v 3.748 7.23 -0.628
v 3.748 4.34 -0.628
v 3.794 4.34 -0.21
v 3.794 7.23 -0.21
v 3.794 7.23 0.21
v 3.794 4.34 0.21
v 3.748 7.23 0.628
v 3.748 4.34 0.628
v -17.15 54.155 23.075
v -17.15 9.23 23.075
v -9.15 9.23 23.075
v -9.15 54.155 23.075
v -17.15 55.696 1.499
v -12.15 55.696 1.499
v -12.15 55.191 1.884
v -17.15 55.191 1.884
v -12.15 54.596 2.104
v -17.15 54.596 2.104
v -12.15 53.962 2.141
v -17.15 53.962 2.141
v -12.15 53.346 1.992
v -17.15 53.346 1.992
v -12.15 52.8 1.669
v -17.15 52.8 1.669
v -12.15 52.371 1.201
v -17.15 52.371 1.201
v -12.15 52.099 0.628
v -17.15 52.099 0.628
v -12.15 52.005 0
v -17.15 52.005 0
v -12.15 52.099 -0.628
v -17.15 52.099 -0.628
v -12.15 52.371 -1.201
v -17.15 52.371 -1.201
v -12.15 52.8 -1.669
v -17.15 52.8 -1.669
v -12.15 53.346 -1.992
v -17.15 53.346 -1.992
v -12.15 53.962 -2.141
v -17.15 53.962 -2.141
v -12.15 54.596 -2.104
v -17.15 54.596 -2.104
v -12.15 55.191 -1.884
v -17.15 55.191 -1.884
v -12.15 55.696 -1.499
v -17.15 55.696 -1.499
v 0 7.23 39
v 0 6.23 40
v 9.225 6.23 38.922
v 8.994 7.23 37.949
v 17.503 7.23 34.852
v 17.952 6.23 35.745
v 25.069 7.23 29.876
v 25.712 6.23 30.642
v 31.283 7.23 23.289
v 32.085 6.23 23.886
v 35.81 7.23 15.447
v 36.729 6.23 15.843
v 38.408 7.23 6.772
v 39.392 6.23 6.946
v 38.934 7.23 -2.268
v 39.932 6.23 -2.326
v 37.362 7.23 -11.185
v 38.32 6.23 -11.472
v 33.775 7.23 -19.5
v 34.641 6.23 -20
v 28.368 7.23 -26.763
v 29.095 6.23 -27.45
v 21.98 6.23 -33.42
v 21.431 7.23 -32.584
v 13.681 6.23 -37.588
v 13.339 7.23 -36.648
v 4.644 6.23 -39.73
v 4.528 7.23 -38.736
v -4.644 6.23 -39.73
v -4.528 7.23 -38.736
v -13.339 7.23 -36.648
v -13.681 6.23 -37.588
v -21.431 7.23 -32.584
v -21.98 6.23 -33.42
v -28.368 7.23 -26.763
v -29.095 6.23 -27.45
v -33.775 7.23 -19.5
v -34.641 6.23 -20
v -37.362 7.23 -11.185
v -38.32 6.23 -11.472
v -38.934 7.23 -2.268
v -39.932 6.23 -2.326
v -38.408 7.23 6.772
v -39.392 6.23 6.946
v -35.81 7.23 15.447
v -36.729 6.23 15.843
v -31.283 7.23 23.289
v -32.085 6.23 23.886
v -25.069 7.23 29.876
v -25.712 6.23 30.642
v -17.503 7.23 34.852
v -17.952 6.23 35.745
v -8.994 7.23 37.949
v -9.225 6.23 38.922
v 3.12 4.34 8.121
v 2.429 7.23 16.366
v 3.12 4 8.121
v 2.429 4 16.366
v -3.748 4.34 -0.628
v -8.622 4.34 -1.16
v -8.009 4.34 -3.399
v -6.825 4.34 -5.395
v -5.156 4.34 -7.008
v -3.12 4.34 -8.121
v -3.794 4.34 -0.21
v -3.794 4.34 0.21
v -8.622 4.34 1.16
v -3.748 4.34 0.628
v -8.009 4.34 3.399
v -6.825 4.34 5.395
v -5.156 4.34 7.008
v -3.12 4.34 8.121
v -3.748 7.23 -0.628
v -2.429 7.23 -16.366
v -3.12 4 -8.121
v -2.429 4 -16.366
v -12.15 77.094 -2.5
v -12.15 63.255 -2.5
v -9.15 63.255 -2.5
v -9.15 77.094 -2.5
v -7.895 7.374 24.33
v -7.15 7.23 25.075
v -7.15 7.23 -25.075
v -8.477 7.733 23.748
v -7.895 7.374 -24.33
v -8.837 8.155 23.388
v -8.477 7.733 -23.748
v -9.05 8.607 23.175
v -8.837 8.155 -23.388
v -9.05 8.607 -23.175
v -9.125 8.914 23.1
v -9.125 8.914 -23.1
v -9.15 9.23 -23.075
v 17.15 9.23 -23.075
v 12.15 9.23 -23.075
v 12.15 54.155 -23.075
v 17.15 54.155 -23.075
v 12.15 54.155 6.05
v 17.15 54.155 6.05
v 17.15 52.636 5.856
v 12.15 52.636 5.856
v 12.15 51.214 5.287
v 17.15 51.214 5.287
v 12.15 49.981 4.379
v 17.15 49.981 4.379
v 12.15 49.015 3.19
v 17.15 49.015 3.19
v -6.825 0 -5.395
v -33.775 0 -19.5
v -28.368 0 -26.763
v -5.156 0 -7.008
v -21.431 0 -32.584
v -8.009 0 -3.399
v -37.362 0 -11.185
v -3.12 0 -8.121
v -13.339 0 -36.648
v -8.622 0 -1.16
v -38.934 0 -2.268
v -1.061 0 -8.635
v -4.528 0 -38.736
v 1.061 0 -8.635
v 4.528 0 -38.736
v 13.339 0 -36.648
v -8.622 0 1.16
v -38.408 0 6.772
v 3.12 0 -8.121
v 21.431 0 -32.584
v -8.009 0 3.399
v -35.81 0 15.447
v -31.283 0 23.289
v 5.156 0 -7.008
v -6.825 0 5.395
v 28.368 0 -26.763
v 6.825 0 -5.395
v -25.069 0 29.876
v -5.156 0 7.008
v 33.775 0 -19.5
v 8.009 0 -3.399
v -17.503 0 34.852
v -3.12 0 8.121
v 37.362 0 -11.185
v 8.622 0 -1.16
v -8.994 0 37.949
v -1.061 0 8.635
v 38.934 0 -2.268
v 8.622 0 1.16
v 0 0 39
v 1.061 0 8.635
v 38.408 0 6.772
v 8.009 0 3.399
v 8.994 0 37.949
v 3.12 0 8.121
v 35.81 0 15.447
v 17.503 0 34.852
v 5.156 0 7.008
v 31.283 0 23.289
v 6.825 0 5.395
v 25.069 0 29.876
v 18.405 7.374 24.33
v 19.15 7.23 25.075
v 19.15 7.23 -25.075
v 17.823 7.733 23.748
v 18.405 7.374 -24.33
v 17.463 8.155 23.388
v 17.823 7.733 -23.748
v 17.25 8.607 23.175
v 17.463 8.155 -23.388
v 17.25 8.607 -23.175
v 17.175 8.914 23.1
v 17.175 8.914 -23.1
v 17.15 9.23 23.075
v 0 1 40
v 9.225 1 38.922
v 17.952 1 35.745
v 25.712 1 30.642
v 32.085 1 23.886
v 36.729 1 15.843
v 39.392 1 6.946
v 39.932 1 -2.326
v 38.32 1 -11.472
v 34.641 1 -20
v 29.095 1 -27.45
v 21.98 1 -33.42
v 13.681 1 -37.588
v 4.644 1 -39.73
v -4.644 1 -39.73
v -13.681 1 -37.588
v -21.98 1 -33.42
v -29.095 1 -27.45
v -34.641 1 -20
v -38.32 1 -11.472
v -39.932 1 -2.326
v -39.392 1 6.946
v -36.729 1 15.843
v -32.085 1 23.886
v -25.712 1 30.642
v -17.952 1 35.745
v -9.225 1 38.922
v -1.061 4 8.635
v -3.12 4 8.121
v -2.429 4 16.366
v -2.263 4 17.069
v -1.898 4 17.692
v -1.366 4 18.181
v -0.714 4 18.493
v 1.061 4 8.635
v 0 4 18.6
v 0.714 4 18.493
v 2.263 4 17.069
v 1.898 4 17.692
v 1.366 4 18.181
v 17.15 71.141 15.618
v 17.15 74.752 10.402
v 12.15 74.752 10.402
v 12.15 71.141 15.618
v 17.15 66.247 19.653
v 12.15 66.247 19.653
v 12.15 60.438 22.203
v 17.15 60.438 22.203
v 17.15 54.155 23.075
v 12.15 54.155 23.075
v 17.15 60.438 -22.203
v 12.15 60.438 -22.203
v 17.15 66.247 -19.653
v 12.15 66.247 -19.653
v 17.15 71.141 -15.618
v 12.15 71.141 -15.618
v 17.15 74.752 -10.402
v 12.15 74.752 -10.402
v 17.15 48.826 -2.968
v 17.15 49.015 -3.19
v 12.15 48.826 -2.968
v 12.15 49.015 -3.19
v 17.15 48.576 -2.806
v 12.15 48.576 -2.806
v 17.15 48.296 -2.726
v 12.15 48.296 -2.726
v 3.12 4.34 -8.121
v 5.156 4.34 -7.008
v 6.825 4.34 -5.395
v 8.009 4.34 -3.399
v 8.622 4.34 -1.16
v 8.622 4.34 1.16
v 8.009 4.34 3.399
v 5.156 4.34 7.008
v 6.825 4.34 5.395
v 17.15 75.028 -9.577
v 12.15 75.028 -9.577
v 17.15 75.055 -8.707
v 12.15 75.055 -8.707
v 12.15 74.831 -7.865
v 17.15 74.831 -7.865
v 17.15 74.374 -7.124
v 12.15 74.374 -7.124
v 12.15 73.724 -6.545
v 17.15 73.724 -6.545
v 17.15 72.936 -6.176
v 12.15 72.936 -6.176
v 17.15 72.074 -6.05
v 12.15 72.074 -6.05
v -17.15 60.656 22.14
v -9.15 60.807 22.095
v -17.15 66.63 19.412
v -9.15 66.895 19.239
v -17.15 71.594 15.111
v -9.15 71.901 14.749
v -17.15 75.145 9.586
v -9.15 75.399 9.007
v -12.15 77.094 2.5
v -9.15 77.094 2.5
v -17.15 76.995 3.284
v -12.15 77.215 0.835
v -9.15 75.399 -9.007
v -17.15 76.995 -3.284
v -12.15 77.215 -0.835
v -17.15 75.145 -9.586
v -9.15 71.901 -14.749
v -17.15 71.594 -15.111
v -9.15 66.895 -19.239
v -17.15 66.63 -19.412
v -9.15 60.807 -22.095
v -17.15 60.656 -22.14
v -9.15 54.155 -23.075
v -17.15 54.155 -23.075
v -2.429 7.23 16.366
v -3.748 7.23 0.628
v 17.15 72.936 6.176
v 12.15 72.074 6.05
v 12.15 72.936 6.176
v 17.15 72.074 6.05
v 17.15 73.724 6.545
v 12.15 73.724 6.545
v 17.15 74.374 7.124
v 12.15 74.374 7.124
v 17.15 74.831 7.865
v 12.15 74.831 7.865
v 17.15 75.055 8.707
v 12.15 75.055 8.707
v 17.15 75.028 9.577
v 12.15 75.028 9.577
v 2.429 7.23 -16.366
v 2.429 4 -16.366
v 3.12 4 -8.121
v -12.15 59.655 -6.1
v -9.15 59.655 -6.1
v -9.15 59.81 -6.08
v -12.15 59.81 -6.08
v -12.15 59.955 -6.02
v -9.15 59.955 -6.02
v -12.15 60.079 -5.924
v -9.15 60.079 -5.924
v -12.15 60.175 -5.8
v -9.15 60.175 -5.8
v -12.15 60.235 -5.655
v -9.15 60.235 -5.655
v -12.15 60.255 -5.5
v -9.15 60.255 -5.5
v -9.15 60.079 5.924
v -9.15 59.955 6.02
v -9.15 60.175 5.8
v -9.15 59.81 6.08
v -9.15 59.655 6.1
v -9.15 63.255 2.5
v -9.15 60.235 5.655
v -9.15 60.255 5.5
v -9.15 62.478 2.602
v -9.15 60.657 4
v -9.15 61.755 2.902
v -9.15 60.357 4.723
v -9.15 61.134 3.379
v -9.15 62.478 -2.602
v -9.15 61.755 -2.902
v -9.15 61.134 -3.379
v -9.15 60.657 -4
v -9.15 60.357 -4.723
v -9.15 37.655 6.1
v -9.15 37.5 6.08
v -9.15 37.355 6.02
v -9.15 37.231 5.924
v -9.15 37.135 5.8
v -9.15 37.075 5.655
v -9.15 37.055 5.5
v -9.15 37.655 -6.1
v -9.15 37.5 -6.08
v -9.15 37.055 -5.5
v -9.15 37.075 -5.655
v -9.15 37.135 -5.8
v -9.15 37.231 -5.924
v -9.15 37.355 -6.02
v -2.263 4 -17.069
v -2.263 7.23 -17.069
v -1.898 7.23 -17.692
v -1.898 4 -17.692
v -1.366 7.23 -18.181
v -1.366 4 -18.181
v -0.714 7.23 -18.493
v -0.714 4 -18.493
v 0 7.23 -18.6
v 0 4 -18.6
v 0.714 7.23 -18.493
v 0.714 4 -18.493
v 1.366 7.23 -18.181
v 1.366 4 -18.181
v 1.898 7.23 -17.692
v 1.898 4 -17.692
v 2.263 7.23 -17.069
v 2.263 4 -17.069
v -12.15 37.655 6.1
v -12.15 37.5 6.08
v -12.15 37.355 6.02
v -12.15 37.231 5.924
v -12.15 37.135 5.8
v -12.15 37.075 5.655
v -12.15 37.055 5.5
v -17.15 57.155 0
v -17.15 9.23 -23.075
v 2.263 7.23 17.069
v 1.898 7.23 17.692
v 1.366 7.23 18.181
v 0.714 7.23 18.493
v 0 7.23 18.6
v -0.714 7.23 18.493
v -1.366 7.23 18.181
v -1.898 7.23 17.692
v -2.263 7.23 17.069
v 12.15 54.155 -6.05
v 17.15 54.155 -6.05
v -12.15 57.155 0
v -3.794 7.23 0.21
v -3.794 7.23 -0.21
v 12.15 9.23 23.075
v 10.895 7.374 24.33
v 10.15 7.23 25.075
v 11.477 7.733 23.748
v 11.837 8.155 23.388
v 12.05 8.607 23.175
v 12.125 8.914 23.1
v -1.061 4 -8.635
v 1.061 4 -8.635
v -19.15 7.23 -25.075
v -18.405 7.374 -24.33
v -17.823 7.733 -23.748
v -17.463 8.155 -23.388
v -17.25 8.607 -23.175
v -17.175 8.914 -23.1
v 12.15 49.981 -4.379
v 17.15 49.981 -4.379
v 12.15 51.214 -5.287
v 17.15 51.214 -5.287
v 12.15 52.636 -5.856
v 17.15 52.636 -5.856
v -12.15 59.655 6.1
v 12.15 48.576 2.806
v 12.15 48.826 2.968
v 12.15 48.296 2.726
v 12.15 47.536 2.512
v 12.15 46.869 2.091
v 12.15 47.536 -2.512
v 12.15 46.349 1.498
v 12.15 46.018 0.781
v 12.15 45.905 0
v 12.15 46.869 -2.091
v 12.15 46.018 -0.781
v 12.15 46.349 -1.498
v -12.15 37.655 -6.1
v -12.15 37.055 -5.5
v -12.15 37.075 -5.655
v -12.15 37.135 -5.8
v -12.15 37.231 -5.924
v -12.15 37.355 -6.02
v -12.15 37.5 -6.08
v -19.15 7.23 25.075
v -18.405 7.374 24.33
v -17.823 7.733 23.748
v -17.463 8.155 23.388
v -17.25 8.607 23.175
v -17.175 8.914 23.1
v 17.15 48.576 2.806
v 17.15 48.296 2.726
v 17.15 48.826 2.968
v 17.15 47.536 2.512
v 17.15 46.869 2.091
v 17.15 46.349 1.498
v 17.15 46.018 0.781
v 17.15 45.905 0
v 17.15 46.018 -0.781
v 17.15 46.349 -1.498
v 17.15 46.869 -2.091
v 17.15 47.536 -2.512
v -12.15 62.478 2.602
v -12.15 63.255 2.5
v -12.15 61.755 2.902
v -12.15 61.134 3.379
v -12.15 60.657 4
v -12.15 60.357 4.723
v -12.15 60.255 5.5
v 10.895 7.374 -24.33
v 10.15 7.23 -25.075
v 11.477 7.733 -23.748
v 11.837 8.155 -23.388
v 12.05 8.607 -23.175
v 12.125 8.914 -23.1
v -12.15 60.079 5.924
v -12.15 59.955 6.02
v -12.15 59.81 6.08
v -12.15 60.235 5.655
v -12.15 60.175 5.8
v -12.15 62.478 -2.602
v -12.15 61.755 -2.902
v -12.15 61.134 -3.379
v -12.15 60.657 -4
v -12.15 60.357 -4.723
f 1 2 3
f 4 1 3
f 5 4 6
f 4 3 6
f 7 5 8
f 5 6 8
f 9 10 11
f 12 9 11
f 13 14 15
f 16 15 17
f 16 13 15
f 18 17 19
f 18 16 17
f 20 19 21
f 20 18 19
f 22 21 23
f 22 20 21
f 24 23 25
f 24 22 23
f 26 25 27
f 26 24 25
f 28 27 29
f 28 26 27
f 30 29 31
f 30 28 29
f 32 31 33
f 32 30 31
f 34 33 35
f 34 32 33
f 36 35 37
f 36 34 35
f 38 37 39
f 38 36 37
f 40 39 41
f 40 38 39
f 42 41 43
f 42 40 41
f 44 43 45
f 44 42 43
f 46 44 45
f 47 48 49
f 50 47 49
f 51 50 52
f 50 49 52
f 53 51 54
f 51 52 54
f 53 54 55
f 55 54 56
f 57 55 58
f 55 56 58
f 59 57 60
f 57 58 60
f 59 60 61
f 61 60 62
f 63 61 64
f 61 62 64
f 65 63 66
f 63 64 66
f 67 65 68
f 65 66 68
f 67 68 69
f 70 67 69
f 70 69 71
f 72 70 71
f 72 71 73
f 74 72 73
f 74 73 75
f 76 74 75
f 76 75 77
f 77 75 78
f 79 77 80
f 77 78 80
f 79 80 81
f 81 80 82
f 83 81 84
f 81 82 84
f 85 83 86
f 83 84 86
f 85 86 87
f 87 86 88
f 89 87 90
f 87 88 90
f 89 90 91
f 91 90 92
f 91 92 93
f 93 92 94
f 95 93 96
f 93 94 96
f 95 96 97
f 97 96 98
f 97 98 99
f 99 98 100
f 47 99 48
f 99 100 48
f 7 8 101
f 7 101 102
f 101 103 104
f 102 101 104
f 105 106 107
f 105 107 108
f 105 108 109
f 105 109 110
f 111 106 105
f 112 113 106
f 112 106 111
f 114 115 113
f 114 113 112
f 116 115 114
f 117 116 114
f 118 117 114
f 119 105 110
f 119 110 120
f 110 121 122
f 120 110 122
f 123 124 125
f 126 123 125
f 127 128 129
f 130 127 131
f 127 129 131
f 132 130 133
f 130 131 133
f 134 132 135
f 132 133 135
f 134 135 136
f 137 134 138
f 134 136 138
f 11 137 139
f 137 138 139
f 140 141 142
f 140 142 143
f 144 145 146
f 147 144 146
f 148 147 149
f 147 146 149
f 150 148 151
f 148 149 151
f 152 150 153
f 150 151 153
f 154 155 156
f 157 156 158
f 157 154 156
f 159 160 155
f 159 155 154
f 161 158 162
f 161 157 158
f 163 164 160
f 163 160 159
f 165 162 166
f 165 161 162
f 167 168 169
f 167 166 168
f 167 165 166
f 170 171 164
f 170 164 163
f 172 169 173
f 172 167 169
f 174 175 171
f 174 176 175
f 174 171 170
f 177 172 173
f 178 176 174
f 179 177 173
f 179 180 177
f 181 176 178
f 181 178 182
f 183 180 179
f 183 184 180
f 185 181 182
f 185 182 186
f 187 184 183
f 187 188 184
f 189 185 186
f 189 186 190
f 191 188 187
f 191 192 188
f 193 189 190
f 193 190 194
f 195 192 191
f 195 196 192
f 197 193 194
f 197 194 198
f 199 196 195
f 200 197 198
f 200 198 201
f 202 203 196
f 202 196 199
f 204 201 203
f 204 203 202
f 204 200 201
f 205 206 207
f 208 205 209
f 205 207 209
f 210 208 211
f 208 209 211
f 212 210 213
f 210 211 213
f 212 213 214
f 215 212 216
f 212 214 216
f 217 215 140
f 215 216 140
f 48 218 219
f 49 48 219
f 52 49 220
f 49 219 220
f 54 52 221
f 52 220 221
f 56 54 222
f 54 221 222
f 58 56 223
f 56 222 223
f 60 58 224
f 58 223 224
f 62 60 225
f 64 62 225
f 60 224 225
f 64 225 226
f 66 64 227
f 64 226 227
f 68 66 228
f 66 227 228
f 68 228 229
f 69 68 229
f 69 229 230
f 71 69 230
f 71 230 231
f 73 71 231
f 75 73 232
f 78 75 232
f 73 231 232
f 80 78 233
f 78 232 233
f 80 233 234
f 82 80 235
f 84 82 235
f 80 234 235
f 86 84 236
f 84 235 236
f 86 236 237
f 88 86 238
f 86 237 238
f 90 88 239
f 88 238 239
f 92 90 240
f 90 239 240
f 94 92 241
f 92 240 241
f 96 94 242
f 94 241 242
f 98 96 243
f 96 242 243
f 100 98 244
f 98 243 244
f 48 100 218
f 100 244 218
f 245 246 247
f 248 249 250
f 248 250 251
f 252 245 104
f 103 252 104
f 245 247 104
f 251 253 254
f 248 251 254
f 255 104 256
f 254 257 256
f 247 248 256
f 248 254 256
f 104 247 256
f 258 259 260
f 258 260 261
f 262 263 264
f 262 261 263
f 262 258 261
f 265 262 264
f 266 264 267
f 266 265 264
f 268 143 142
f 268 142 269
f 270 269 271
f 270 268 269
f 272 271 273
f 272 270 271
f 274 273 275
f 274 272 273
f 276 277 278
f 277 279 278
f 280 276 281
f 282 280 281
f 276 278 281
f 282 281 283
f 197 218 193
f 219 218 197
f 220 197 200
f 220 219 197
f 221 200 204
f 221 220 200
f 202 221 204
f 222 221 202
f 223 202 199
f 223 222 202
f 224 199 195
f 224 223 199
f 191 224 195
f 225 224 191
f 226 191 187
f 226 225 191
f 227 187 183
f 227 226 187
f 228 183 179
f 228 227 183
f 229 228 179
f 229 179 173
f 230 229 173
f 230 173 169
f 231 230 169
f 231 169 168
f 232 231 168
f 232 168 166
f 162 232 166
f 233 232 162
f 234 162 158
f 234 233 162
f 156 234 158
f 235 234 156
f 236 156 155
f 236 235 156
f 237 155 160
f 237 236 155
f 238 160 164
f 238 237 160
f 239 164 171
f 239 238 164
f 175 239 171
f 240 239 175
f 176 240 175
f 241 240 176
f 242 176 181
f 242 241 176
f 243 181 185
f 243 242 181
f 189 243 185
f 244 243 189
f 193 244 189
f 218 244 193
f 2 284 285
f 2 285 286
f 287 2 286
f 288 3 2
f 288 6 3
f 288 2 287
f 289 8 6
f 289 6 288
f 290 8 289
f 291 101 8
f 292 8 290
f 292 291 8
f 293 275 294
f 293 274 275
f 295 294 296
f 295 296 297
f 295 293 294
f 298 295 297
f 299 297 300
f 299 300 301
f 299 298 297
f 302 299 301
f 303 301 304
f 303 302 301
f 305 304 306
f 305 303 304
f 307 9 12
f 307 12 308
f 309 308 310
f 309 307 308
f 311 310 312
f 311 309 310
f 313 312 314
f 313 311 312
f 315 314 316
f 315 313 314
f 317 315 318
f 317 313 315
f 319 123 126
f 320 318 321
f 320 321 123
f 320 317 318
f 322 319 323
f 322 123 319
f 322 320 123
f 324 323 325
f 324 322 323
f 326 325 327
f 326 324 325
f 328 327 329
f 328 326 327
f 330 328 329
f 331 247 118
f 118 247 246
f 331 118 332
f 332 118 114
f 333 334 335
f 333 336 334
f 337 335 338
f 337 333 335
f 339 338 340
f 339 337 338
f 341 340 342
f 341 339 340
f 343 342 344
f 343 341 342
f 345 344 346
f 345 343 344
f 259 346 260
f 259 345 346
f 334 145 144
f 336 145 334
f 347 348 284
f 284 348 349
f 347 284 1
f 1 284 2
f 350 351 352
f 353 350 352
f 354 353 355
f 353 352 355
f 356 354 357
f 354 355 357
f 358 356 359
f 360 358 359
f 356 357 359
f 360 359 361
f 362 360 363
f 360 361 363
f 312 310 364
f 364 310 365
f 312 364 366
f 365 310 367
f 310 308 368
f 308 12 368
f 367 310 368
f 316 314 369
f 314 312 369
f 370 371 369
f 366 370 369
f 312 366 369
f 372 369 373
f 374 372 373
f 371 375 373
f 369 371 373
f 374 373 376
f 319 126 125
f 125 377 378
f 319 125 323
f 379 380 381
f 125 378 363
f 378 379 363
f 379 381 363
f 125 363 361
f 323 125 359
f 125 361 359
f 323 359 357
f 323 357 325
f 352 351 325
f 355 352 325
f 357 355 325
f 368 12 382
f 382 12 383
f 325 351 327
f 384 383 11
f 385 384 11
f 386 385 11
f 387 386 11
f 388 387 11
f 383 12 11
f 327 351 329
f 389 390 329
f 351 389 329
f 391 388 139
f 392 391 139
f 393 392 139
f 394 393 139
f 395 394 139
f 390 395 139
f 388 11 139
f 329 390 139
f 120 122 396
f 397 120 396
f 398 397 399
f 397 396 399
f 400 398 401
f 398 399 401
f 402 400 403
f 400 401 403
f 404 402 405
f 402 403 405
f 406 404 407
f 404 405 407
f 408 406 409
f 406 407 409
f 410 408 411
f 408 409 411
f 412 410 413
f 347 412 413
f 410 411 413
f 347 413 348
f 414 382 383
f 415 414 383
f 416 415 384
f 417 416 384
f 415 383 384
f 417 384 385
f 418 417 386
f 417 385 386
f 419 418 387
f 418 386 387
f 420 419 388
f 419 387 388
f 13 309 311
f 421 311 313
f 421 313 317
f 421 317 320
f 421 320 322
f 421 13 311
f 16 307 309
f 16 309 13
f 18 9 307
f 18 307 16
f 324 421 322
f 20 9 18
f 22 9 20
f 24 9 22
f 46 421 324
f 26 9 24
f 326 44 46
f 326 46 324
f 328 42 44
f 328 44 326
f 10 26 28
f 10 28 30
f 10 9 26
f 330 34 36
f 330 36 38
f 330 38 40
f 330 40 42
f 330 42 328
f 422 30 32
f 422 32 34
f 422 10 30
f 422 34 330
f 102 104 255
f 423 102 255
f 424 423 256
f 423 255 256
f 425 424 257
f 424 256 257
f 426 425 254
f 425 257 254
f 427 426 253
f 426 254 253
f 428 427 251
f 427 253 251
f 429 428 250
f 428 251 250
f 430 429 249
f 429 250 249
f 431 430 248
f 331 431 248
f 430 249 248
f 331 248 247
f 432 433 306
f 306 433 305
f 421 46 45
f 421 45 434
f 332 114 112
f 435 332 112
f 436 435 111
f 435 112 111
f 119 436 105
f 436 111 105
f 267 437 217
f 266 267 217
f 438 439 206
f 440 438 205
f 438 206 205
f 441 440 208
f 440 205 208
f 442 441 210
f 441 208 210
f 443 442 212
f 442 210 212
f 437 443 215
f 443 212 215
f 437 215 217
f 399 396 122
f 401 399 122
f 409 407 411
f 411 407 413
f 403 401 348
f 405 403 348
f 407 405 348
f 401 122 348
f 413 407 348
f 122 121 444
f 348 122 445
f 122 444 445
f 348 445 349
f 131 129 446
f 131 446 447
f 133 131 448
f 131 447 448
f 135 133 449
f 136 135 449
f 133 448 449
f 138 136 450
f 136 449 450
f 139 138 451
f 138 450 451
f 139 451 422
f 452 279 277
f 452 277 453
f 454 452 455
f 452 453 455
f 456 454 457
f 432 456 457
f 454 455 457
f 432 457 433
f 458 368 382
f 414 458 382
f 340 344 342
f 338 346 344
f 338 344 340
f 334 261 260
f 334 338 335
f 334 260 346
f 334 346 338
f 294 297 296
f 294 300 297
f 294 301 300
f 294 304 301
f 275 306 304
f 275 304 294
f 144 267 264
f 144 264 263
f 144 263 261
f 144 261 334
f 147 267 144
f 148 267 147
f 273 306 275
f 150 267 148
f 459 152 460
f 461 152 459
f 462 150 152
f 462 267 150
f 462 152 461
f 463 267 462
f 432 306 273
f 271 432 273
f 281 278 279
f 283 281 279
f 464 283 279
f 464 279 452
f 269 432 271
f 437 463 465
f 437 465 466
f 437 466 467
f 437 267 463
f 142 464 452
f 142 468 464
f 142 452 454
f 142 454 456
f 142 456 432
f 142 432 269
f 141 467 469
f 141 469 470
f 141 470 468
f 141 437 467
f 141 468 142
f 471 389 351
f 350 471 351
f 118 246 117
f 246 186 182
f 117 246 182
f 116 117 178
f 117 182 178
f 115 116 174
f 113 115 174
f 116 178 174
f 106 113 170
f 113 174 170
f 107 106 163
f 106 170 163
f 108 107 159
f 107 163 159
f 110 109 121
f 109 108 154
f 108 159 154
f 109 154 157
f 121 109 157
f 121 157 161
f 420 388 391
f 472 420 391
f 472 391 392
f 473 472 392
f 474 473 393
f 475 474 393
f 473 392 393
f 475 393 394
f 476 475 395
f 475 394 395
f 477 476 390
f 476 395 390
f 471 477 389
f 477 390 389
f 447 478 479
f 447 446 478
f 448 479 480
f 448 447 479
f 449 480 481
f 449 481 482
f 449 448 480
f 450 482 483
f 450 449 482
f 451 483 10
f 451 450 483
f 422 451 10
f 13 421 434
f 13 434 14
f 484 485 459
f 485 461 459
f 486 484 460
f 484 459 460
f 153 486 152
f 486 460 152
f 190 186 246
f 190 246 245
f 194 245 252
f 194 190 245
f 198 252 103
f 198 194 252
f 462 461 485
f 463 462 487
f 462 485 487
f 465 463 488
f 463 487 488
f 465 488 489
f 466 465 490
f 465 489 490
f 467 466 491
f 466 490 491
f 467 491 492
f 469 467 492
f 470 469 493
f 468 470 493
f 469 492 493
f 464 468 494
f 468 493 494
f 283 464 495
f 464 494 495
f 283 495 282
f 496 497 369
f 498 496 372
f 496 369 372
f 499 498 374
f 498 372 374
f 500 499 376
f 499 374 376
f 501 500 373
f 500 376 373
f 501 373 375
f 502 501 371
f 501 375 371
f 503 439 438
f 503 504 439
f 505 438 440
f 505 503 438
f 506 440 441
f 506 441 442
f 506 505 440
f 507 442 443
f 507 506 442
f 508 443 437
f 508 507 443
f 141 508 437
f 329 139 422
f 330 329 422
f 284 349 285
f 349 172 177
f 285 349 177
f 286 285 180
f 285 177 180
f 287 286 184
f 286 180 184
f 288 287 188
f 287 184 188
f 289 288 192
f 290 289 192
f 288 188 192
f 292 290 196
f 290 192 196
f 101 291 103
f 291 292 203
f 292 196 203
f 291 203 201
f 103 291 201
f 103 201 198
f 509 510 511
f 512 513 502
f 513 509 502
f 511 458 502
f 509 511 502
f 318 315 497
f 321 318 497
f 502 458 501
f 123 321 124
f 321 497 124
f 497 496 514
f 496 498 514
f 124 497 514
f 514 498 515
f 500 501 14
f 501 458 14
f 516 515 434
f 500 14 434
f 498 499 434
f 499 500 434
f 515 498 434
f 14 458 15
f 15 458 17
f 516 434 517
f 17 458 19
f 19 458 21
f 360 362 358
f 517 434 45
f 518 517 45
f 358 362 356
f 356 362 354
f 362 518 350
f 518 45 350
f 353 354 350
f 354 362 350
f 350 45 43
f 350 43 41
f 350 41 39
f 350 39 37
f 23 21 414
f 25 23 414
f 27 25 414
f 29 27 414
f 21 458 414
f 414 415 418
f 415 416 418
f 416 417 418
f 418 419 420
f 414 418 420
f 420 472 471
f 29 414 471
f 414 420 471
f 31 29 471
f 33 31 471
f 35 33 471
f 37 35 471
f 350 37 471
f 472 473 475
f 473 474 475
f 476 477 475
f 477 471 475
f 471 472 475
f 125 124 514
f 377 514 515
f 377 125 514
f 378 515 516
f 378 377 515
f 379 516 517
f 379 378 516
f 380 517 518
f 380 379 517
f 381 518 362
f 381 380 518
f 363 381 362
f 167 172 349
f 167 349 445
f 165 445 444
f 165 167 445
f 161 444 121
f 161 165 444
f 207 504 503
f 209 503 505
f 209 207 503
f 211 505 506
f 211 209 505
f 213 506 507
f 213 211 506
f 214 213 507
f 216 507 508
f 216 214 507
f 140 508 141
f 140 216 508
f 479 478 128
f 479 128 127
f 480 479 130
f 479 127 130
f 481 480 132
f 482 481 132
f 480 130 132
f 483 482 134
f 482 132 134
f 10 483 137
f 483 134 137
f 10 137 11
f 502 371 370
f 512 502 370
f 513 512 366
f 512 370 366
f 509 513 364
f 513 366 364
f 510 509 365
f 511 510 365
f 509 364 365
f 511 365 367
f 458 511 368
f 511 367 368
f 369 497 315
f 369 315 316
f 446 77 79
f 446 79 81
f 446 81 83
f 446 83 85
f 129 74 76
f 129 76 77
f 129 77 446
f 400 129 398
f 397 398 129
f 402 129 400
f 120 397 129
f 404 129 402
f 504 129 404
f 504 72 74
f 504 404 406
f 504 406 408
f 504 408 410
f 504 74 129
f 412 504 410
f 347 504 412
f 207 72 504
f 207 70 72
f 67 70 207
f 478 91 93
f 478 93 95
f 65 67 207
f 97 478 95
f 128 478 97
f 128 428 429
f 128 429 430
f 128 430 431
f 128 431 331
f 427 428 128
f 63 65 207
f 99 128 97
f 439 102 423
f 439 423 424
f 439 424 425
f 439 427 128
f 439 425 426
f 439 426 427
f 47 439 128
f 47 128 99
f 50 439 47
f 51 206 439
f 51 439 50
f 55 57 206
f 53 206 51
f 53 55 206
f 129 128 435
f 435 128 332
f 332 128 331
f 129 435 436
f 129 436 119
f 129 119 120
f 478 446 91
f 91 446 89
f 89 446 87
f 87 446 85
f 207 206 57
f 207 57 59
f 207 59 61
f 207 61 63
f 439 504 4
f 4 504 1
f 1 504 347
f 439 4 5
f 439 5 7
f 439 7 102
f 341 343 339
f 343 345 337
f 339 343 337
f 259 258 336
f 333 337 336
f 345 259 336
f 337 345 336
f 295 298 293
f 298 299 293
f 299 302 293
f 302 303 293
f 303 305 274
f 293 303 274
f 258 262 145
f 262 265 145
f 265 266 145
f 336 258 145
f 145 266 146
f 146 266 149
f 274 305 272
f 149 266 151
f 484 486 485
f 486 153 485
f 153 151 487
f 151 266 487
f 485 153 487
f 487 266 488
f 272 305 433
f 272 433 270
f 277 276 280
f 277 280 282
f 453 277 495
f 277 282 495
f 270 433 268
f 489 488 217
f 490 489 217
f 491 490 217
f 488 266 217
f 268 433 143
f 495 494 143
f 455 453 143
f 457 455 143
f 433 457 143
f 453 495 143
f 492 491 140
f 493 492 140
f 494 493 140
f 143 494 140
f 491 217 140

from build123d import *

# Parameters (mm, degrees)
SKETCH4_R                       = 40
BOSS_EXTRUDE2_DEPTH             = 7.23
SKETCH8_W                       = 3
SKETCH8_H                       = 46.15
SKETCH8_W_2                     = 5
BOSS_EXTRUDE3_DEPTH             = 70
FILLET2_RADIUS                  = 23.075
FILLET2_LENGTH                  = 8
FILLET3_RADIUS                  = 23.075
FILLET3_LENGTH                  = 5
FILLET4_R                       = 2
CUT_EXTRUDE3_DEPTH              = 5
FILLET6_R                       = 1
CUT_EXTRUDE4_DEPTH              = 3
F_4_0_START                     = -17.15
F_4_0_MM_DOWEL_HOLES1_OUTLINE_R = 2.15
F_4_0_MM_DOWEL_HOLES1_DEPTH     = 5
CUT_EXTRUDE5_DEPTH              = 37.055
SKETCH19_R                      = 8.7
CUT_EXTRUDE8_DEPTH              = 4.34
CHAMFER1_SIZE                   = 1
CUT_EXTRUDE9_REACH              = 106.07
SKETCH20_W                      = 12.1
SKETCH20_H                      = 23.075
CUT_EXTRUDE10_REACH             = 106.07
CUT_EXTRUDE11_START             = 60.255
SKETCH22_W                      = 3
SKETCH22_H                      = 5
CUT_EXTRUDE11_DEPTH             = 16.975
FILLET9_R                       = 3
FILLET10_R                      = 3
FILLET8_R                       = 3
BOSS_EXTRUDE4_DEPTH             = 4


# Read off the part's stored shape, not the designer's step: Ø4.0 mm Dowel Holes1
with BuildPart() as part:
    # Sketch4 → Boss-Extrude2 (new body)
    with BuildSketch(Plane(origin=(0, 0, 0), x_dir=(1, 0, 0), z_dir=(0, 1, 0))):
        with Locations(Location((0, 0, 0), (0, 0, 270))):
            Circle(SKETCH4_R)
    extrude(amount=BOSS_EXTRUDE2_DEPTH)

    # Sketch8 → Boss-Extrude3 (add)
    with BuildSketch(Plane(origin=(0, 7.23, 0), x_dir=(1, 0, 0), z_dir=(0, 1, 0))):
        with Locations((-10.65, 0)):
            Rectangle(SKETCH8_W, SKETCH8_H)
        with Locations((-14.65, 0)):
            Rectangle(SKETCH8_W_2, SKETCH8_H)
        with Locations((14.65, 0)):
            Rectangle(SKETCH8_W_2, SKETCH8_H)
    extrude(amount=BOSS_EXTRUDE3_DEPTH)

    # Fillet2: full round fillet: the end face becomes a half cylinder, R = half its width
    fillet2_face = Plane((-13.15, 77.23, 0), x_dir=(-1, 0, 0), z_dir=(0, 1, 0))  # on the end face: x along it, z out of the body
    fillet2_slab = fillet2_face.offset(-FILLET2_RADIUS / 2) * Box(FILLET2_LENGTH, 2 * FILLET2_RADIUS, FILLET2_RADIUS, mode=Mode.PRIVATE)  # the body's end, R deep
    fillet2_round = Plane((-13.15, 54.155, 0), x_dir=(0, 1, 0), z_dir=(-1, 0, 0)) * Cylinder(FILLET2_RADIUS, FILLET2_LENGTH, mode=Mode.PRIVATE)  # its axis R under the face
    add(fillet2_slab - fillet2_round, mode=Mode.SUBTRACT)

    # Fillet3: full round fillet: the end face becomes a half cylinder, R = half its width
    fillet3_face = Plane((14.65, 77.23, 0), x_dir=(1, 0, 0), z_dir=(0, 1, 0))  # on the end face: x along it, z out of the body
    fillet3_slab = fillet3_face.offset(-FILLET3_RADIUS / 2) * Box(FILLET3_LENGTH, 2 * FILLET3_RADIUS, FILLET3_RADIUS, mode=Mode.PRIVATE)  # the body's end, R deep
    fillet3_round = Plane((14.65, 54.155, 0), x_dir=(0, 1, 0), z_dir=(1, 0, 0)) * Cylinder(FILLET3_RADIUS, FILLET3_LENGTH, mode=Mode.PRIVATE)  # its axis R under the face
    add(fillet3_slab - fillet3_round, mode=Mode.SUBTRACT)

    # Fillet4
    fillet4_edges = [part.edges().sort_by_distance(p)[0] for p in [
        (-9.15, 7.23, 0),
        (-17.15, 7.23, 0),
        (-13.15, 7.23, -23.075),
        (17.15, 7.23, 0),
        (14.65, 7.23, -23.075),
        (12.15, 7.23, 0),
        (14.65, 7.23, 23.075),
        (-13.15, 7.23, 23.075),
    ]]
    fillet(fillet4_edges, radius=FILLET4_R)

    # Sketch10 → Cut-Extrude3 (cut)
    with BuildSketch(Plane(origin=(17.15, 0, 0), x_dir=(0, 0, -1), z_dir=(1, 0, 0))):
        with BuildLine():
            ThreePointArc((-2.747799119, 48.765), (-1.983053202, 46.749744112), (0, 45.905))
            Line((0, 45.905), (0, 48.105))
            ThreePointArc((0, 48.105), (-1.412975584, 48.272313539), (-2.747799119, 48.765))
        make_face()
        with BuildLine():
            Line((0, 48.105), (0, 45.905))
            ThreePointArc((0, 45.905), (1.944543648, 46.710456352), (2.75, 48.655))
            ThreePointArc((2.75, 48.655), (2.749449725, 48.710011008), (2.747799119, 48.765))
            ThreePointArc((2.747799119, 48.765), (1.412975584, 48.272313539), (0, 48.105))
        make_face()
        with BuildLine():
            ThreePointArc((-2.747799119, 48.765), (-1.412975584, 48.272313539), (0, 48.105))
            Line((0, 48.105), (0, 51.405))
            ThreePointArc((0, 51.405), (-1.905255888, 50.638053202), (-2.747799119, 48.765))
        make_face()
        with BuildLine():
            Line((0, 51.405), (0, 48.105))
            ThreePointArc((0, 48.105), (1.412975584, 48.272313539), (2.747799119, 48.765))
            ThreePointArc((2.747799119, 48.765), (1.905255888, 50.638053202), (0, 51.405))
        make_face()
        with BuildLine():
            ThreePointArc((0, 60.205), (-5.882686461, 55.567975584), (-2.747799119, 48.765))
            ThreePointArc((-2.747799119, 48.765), (-1.905255888, 50.638053202), (0, 51.405))
            Line((0, 51.405), (0, 60.205))
        make_face()
        with BuildLine():
            Line((0, 60.205), (0, 51.405))
            ThreePointArc((0, 51.405), (1.905255888, 50.638053202), (2.747799119, 48.765))
            ThreePointArc((2.747799119, 48.765), (5.158812105, 50.994437129), (6.05, 54.155))
            ThreePointArc((6.05, 54.155), (4.277996026, 58.432996026), (0, 60.205))
        make_face()
    extrude(amount=-CUT_EXTRUDE3_DEPTH, mode=Mode.SUBTRACT)

    # Fillet6
    fillet6_edges = [part.edges().sort_by_distance(p)[0] for p in [
        (14.65, 48.765, -2.747799119),
        (14.65, 48.765, 2.747799119),
    ]]
    fillet(fillet6_edges, radius=FILLET6_R)

    # Sketch11 → Cut-Extrude4 (cut)
    # profile 1 of 2: a face of its own
    with BuildSketch(Plane(origin=(-9.15, 0, 0), x_dir=(0, 0, -1), z_dir=(1, 0, 0))):
        with BuildLine():
            Line((6.1, 54.155), (6.1, 59.655))
            ThreePointArc((6.1, 59.655), (5.924264069, 60.079264069), (5.5, 60.255))
            Line((5.5, 60.255), (0, 60.255))
            Line((0, 60.255), (-5.5, 60.255))
            ThreePointArc((-5.5, 60.255), (-5.924264069, 60.079264069), (-6.1, 59.655))
            Line((-6.1, 59.655), (-6.1, 54.155))
            Line((-6.1, 54.155), (-6.1, 37.655))
            ThreePointArc((-6.1, 37.655), (-5.924264069, 37.230735931), (-5.5, 37.055))
            Line((-5.5, 37.055), (5.5, 37.055))
            ThreePointArc((5.5, 37.055), (5.924264069, 37.230735931), (6.1, 37.655))
            Line((6.1, 37.655), (6.1, 54.155))
        make_face()
        with BuildLine():
            ThreePointArc((-5.5, 60.155), (-5.853553391, 60.008553391), (-6, 59.655))
            Line((-6, 59.655), (-6, 54.155))
            Line((-6, 54.155), (-6, 37.655))
            ThreePointArc((-6, 37.655), (-5.853553391, 37.301446609), (-5.5, 37.155))
            Line((-5.5, 37.155), (5.5, 37.155))
            ThreePointArc((5.5, 37.155), (5.853553391, 37.301446609), (6, 37.655))
            Line((6, 37.655), (6, 54.155))
            Line((6, 54.155), (6, 59.655))
            ThreePointArc((6, 59.655), (5.853553391, 60.008553391), (5.5, 60.155))
            Line((5.5, 60.155), (0, 60.155))
            Line((0, 60.155), (-5.5, 60.155))
        make_face(mode=Mode.SUBTRACT)
    # profile 2 of 2: a face of its own
    with BuildSketch(Plane(origin=(-9.15, 0, 0), x_dir=(0, 0, -1), z_dir=(1, 0, 0))):
        with BuildLine():
            Line((0, 60.155), (-5.5, 60.155))
            ThreePointArc((-5.5, 60.155), (-5.853553391, 60.008553391), (-6, 59.655))
            Line((-6, 59.655), (-6, 54.155))
            Line((-6, 54.155), (-6, 37.655))
            ThreePointArc((-6, 37.655), (-5.853553391, 37.301446609), (-5.5, 37.155))
            Line((-5.5, 37.155), (5.5, 37.155))
            ThreePointArc((5.5, 37.155), (5.853553391, 37.301446609), (6, 37.655))
            Line((6, 37.655), (6, 54.155))
            Line((6, 54.155), (6, 59.655))
            ThreePointArc((6, 59.655), (5.853553391, 60.008553391), (5.5, 60.155))
            Line((5.5, 60.155), (0, 60.155))
        make_face()
    extrude(amount=-CUT_EXTRUDE4_DEPTH, mode=Mode.SUBTRACT)

    # Ø4.0 mm Dowel Holes1 outline → Ø4.0 mm Dowel Holes1 (cut)
    with BuildSketch(Plane.YZ.offset(F_4_0_START)):
        with Locations((54.155, 0)):
            Circle(F_4_0_MM_DOWEL_HOLES1_OUTLINE_R)
    extrude(amount=F_4_0_MM_DOWEL_HOLES1_DEPTH, mode=Mode.SUBTRACT)

    # Sketch17 → Cut-Extrude5 (cut)
    with BuildSketch(Plane.XZ):
        with BuildLine():
            ThreePointArc((-2.429157046, -16.365855829), (0, -18.6), (2.429157046, -16.365855829))
            Line((2.429157046, -16.365855829), (3.747720192, -0.628166667))
            ThreePointArc((3.747720192, -0.628166667), (3.8, 0), (3.747720192, 0.628166667))
            Line((3.747720192, 0.628166667), (2.429157046, 16.365855829))
            ThreePointArc((2.429157046, 16.365855829), (0, 18.6), (-2.429157046, 16.365855829))
            Line((-2.429157046, 16.365855829), (-3.747720192, 0.628166667))
            ThreePointArc((-3.747720192, 0.628166667), (-3.8, 0), (-3.747720192, -0.628166667))
            Line((-3.747720192, -0.628166667), (-2.429157046, -16.365855829))
        make_face()
    extrude(amount=-CUT_EXTRUDE5_DEPTH, mode=Mode.SUBTRACT)

    # Sketch19 → Cut-Extrude8 (cut)
    with BuildSketch(Plane.XZ):
        Circle(SKETCH19_R)
    extrude(amount=-CUT_EXTRUDE8_DEPTH, mode=Mode.SUBTRACT)

    # Chamfer1
    chamfer1_edges = [part.edges().sort_by_distance(p)[0] for p in [
        (0, 0, -40),
        (0, 7.23, -40),
    ]]
    chamfer(chamfer1_edges, length=CHAMFER1_SIZE)

    # Sketch20 → Cut-Extrude9 (cut, up to next)
    with BuildSketch(Plane(origin=(17.15, 0, 0), x_dir=(0, 0, -1), z_dir=(1, 0, 0)), mode=Mode.PRIVATE) as cut_extrude9_sk1:
        with Locations((0, 65.6925)):
            Rectangle(SKETCH20_W, SKETCH20_H)
    cut_extrude9_tool1 = extrude(cut_extrude9_sk1.sketch, amount=-CUT_EXTRUDE9_REACH, mode=Mode.PRIVATE) & part.part
    add(cut_extrude9_tool1.solids().sort_by_distance((17.15, 65.6925, 0))[0], mode=Mode.SUBTRACT)

    # Sketch21 → Cut-Extrude10 (cut, up to next)
    with BuildSketch(Plane.ZY.offset(17.15), mode=Mode.PRIVATE) as cut_extrude10_sk1:
        Polygon((-1.49944411, 55.695833333), (0, 57.155), (1.49944411, 55.695833333), align=None)
    cut_extrude10_tool1 = extrude(cut_extrude10_sk1.sketch, amount=-CUT_EXTRUDE10_REACH, mode=Mode.PRIVATE) & part.part
    add(cut_extrude10_tool1.solids().sort_by_distance((-17.15, 56.182222, 0))[0], mode=Mode.SUBTRACT)

    # Sketch22 → Cut-Extrude11 (cut)
    with BuildSketch(Plane(origin=(0, 0, 0), x_dir=(1, 0, 0), z_dir=(0, 1, 0)).offset(CUT_EXTRUDE11_START)):
        with Locations((-10.65, 0)):
            Rectangle(SKETCH22_W, SKETCH22_H)
    extrude(amount=CUT_EXTRUDE11_DEPTH, mode=Mode.SUBTRACT)

    # Fillet9
    fillet9_edges = [part.edges().sort_by_distance(p)[0] for p in [
        (-10.65, 60.255, 2.5),
    ]]
    fillet(fillet9_edges, radius=FILLET9_R - 0.0001)  # a hair under: the kernel refuses the full size

    # Fillet10
    fillet10_edges = [part.edges().sort_by_distance(p)[0] for p in [
        (-10.65, 60.255, -2.5),
    ]]
    fillet(fillet10_edges, radius=FILLET10_R - 0.0001)  # a hair under: the kernel refuses the full size

    # Fillet8
    fillet8_edges = [part.edges().sort_by_distance(p)[0] for p in [
        (14.65, 76.422759766, -6.05),
        (14.65, 76.422759766, 6.05),
    ]]
    fillet(fillet8_edges, radius=FILLET8_R)

    # Sketch23 → Boss-Extrude4 (add)
    with BuildSketch(Plane.XZ):
        with BuildLine():
            ThreePointArc((-2.429157046, -16.365855829), (0, -18.6), (2.429157046, -16.365855829))
            Line((2.429157046, -16.365855829), (3.119913913, -8.121338386))
            ThreePointArc((3.119913913, -8.121338386), (0, -8.7), (-3.119913913, -8.121338386))
            Line((-3.119913913, -8.121338386), (-2.429157046, -16.365855829))
        make_face()
        with BuildLine():
            Line((-2.429157046, 16.365855829), (-3.119913913, 8.121338386))
            ThreePointArc((-3.119913913, 8.121338386), (0, 8.7), (3.119913913, 8.121338386))
            Line((3.119913913, 8.121338386), (2.429157046, 16.365855829))
            ThreePointArc((2.429157046, 16.365855829), (0, 18.6), (-2.429157046, 16.365855829))
        make_face()
    extrude(amount=-BOSS_EXTRUDE4_DEPTH)


solid = part.part
